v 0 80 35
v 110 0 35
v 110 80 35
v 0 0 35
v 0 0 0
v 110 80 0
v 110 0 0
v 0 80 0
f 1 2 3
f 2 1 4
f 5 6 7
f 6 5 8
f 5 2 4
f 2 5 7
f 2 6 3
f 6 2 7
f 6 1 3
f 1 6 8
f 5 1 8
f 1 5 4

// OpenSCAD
// Satuan mm. Tahap pertama hanya menetapkan ukuran luar.
L = 110;
W = 80;
H = 35;
cube([L,W,H]);
